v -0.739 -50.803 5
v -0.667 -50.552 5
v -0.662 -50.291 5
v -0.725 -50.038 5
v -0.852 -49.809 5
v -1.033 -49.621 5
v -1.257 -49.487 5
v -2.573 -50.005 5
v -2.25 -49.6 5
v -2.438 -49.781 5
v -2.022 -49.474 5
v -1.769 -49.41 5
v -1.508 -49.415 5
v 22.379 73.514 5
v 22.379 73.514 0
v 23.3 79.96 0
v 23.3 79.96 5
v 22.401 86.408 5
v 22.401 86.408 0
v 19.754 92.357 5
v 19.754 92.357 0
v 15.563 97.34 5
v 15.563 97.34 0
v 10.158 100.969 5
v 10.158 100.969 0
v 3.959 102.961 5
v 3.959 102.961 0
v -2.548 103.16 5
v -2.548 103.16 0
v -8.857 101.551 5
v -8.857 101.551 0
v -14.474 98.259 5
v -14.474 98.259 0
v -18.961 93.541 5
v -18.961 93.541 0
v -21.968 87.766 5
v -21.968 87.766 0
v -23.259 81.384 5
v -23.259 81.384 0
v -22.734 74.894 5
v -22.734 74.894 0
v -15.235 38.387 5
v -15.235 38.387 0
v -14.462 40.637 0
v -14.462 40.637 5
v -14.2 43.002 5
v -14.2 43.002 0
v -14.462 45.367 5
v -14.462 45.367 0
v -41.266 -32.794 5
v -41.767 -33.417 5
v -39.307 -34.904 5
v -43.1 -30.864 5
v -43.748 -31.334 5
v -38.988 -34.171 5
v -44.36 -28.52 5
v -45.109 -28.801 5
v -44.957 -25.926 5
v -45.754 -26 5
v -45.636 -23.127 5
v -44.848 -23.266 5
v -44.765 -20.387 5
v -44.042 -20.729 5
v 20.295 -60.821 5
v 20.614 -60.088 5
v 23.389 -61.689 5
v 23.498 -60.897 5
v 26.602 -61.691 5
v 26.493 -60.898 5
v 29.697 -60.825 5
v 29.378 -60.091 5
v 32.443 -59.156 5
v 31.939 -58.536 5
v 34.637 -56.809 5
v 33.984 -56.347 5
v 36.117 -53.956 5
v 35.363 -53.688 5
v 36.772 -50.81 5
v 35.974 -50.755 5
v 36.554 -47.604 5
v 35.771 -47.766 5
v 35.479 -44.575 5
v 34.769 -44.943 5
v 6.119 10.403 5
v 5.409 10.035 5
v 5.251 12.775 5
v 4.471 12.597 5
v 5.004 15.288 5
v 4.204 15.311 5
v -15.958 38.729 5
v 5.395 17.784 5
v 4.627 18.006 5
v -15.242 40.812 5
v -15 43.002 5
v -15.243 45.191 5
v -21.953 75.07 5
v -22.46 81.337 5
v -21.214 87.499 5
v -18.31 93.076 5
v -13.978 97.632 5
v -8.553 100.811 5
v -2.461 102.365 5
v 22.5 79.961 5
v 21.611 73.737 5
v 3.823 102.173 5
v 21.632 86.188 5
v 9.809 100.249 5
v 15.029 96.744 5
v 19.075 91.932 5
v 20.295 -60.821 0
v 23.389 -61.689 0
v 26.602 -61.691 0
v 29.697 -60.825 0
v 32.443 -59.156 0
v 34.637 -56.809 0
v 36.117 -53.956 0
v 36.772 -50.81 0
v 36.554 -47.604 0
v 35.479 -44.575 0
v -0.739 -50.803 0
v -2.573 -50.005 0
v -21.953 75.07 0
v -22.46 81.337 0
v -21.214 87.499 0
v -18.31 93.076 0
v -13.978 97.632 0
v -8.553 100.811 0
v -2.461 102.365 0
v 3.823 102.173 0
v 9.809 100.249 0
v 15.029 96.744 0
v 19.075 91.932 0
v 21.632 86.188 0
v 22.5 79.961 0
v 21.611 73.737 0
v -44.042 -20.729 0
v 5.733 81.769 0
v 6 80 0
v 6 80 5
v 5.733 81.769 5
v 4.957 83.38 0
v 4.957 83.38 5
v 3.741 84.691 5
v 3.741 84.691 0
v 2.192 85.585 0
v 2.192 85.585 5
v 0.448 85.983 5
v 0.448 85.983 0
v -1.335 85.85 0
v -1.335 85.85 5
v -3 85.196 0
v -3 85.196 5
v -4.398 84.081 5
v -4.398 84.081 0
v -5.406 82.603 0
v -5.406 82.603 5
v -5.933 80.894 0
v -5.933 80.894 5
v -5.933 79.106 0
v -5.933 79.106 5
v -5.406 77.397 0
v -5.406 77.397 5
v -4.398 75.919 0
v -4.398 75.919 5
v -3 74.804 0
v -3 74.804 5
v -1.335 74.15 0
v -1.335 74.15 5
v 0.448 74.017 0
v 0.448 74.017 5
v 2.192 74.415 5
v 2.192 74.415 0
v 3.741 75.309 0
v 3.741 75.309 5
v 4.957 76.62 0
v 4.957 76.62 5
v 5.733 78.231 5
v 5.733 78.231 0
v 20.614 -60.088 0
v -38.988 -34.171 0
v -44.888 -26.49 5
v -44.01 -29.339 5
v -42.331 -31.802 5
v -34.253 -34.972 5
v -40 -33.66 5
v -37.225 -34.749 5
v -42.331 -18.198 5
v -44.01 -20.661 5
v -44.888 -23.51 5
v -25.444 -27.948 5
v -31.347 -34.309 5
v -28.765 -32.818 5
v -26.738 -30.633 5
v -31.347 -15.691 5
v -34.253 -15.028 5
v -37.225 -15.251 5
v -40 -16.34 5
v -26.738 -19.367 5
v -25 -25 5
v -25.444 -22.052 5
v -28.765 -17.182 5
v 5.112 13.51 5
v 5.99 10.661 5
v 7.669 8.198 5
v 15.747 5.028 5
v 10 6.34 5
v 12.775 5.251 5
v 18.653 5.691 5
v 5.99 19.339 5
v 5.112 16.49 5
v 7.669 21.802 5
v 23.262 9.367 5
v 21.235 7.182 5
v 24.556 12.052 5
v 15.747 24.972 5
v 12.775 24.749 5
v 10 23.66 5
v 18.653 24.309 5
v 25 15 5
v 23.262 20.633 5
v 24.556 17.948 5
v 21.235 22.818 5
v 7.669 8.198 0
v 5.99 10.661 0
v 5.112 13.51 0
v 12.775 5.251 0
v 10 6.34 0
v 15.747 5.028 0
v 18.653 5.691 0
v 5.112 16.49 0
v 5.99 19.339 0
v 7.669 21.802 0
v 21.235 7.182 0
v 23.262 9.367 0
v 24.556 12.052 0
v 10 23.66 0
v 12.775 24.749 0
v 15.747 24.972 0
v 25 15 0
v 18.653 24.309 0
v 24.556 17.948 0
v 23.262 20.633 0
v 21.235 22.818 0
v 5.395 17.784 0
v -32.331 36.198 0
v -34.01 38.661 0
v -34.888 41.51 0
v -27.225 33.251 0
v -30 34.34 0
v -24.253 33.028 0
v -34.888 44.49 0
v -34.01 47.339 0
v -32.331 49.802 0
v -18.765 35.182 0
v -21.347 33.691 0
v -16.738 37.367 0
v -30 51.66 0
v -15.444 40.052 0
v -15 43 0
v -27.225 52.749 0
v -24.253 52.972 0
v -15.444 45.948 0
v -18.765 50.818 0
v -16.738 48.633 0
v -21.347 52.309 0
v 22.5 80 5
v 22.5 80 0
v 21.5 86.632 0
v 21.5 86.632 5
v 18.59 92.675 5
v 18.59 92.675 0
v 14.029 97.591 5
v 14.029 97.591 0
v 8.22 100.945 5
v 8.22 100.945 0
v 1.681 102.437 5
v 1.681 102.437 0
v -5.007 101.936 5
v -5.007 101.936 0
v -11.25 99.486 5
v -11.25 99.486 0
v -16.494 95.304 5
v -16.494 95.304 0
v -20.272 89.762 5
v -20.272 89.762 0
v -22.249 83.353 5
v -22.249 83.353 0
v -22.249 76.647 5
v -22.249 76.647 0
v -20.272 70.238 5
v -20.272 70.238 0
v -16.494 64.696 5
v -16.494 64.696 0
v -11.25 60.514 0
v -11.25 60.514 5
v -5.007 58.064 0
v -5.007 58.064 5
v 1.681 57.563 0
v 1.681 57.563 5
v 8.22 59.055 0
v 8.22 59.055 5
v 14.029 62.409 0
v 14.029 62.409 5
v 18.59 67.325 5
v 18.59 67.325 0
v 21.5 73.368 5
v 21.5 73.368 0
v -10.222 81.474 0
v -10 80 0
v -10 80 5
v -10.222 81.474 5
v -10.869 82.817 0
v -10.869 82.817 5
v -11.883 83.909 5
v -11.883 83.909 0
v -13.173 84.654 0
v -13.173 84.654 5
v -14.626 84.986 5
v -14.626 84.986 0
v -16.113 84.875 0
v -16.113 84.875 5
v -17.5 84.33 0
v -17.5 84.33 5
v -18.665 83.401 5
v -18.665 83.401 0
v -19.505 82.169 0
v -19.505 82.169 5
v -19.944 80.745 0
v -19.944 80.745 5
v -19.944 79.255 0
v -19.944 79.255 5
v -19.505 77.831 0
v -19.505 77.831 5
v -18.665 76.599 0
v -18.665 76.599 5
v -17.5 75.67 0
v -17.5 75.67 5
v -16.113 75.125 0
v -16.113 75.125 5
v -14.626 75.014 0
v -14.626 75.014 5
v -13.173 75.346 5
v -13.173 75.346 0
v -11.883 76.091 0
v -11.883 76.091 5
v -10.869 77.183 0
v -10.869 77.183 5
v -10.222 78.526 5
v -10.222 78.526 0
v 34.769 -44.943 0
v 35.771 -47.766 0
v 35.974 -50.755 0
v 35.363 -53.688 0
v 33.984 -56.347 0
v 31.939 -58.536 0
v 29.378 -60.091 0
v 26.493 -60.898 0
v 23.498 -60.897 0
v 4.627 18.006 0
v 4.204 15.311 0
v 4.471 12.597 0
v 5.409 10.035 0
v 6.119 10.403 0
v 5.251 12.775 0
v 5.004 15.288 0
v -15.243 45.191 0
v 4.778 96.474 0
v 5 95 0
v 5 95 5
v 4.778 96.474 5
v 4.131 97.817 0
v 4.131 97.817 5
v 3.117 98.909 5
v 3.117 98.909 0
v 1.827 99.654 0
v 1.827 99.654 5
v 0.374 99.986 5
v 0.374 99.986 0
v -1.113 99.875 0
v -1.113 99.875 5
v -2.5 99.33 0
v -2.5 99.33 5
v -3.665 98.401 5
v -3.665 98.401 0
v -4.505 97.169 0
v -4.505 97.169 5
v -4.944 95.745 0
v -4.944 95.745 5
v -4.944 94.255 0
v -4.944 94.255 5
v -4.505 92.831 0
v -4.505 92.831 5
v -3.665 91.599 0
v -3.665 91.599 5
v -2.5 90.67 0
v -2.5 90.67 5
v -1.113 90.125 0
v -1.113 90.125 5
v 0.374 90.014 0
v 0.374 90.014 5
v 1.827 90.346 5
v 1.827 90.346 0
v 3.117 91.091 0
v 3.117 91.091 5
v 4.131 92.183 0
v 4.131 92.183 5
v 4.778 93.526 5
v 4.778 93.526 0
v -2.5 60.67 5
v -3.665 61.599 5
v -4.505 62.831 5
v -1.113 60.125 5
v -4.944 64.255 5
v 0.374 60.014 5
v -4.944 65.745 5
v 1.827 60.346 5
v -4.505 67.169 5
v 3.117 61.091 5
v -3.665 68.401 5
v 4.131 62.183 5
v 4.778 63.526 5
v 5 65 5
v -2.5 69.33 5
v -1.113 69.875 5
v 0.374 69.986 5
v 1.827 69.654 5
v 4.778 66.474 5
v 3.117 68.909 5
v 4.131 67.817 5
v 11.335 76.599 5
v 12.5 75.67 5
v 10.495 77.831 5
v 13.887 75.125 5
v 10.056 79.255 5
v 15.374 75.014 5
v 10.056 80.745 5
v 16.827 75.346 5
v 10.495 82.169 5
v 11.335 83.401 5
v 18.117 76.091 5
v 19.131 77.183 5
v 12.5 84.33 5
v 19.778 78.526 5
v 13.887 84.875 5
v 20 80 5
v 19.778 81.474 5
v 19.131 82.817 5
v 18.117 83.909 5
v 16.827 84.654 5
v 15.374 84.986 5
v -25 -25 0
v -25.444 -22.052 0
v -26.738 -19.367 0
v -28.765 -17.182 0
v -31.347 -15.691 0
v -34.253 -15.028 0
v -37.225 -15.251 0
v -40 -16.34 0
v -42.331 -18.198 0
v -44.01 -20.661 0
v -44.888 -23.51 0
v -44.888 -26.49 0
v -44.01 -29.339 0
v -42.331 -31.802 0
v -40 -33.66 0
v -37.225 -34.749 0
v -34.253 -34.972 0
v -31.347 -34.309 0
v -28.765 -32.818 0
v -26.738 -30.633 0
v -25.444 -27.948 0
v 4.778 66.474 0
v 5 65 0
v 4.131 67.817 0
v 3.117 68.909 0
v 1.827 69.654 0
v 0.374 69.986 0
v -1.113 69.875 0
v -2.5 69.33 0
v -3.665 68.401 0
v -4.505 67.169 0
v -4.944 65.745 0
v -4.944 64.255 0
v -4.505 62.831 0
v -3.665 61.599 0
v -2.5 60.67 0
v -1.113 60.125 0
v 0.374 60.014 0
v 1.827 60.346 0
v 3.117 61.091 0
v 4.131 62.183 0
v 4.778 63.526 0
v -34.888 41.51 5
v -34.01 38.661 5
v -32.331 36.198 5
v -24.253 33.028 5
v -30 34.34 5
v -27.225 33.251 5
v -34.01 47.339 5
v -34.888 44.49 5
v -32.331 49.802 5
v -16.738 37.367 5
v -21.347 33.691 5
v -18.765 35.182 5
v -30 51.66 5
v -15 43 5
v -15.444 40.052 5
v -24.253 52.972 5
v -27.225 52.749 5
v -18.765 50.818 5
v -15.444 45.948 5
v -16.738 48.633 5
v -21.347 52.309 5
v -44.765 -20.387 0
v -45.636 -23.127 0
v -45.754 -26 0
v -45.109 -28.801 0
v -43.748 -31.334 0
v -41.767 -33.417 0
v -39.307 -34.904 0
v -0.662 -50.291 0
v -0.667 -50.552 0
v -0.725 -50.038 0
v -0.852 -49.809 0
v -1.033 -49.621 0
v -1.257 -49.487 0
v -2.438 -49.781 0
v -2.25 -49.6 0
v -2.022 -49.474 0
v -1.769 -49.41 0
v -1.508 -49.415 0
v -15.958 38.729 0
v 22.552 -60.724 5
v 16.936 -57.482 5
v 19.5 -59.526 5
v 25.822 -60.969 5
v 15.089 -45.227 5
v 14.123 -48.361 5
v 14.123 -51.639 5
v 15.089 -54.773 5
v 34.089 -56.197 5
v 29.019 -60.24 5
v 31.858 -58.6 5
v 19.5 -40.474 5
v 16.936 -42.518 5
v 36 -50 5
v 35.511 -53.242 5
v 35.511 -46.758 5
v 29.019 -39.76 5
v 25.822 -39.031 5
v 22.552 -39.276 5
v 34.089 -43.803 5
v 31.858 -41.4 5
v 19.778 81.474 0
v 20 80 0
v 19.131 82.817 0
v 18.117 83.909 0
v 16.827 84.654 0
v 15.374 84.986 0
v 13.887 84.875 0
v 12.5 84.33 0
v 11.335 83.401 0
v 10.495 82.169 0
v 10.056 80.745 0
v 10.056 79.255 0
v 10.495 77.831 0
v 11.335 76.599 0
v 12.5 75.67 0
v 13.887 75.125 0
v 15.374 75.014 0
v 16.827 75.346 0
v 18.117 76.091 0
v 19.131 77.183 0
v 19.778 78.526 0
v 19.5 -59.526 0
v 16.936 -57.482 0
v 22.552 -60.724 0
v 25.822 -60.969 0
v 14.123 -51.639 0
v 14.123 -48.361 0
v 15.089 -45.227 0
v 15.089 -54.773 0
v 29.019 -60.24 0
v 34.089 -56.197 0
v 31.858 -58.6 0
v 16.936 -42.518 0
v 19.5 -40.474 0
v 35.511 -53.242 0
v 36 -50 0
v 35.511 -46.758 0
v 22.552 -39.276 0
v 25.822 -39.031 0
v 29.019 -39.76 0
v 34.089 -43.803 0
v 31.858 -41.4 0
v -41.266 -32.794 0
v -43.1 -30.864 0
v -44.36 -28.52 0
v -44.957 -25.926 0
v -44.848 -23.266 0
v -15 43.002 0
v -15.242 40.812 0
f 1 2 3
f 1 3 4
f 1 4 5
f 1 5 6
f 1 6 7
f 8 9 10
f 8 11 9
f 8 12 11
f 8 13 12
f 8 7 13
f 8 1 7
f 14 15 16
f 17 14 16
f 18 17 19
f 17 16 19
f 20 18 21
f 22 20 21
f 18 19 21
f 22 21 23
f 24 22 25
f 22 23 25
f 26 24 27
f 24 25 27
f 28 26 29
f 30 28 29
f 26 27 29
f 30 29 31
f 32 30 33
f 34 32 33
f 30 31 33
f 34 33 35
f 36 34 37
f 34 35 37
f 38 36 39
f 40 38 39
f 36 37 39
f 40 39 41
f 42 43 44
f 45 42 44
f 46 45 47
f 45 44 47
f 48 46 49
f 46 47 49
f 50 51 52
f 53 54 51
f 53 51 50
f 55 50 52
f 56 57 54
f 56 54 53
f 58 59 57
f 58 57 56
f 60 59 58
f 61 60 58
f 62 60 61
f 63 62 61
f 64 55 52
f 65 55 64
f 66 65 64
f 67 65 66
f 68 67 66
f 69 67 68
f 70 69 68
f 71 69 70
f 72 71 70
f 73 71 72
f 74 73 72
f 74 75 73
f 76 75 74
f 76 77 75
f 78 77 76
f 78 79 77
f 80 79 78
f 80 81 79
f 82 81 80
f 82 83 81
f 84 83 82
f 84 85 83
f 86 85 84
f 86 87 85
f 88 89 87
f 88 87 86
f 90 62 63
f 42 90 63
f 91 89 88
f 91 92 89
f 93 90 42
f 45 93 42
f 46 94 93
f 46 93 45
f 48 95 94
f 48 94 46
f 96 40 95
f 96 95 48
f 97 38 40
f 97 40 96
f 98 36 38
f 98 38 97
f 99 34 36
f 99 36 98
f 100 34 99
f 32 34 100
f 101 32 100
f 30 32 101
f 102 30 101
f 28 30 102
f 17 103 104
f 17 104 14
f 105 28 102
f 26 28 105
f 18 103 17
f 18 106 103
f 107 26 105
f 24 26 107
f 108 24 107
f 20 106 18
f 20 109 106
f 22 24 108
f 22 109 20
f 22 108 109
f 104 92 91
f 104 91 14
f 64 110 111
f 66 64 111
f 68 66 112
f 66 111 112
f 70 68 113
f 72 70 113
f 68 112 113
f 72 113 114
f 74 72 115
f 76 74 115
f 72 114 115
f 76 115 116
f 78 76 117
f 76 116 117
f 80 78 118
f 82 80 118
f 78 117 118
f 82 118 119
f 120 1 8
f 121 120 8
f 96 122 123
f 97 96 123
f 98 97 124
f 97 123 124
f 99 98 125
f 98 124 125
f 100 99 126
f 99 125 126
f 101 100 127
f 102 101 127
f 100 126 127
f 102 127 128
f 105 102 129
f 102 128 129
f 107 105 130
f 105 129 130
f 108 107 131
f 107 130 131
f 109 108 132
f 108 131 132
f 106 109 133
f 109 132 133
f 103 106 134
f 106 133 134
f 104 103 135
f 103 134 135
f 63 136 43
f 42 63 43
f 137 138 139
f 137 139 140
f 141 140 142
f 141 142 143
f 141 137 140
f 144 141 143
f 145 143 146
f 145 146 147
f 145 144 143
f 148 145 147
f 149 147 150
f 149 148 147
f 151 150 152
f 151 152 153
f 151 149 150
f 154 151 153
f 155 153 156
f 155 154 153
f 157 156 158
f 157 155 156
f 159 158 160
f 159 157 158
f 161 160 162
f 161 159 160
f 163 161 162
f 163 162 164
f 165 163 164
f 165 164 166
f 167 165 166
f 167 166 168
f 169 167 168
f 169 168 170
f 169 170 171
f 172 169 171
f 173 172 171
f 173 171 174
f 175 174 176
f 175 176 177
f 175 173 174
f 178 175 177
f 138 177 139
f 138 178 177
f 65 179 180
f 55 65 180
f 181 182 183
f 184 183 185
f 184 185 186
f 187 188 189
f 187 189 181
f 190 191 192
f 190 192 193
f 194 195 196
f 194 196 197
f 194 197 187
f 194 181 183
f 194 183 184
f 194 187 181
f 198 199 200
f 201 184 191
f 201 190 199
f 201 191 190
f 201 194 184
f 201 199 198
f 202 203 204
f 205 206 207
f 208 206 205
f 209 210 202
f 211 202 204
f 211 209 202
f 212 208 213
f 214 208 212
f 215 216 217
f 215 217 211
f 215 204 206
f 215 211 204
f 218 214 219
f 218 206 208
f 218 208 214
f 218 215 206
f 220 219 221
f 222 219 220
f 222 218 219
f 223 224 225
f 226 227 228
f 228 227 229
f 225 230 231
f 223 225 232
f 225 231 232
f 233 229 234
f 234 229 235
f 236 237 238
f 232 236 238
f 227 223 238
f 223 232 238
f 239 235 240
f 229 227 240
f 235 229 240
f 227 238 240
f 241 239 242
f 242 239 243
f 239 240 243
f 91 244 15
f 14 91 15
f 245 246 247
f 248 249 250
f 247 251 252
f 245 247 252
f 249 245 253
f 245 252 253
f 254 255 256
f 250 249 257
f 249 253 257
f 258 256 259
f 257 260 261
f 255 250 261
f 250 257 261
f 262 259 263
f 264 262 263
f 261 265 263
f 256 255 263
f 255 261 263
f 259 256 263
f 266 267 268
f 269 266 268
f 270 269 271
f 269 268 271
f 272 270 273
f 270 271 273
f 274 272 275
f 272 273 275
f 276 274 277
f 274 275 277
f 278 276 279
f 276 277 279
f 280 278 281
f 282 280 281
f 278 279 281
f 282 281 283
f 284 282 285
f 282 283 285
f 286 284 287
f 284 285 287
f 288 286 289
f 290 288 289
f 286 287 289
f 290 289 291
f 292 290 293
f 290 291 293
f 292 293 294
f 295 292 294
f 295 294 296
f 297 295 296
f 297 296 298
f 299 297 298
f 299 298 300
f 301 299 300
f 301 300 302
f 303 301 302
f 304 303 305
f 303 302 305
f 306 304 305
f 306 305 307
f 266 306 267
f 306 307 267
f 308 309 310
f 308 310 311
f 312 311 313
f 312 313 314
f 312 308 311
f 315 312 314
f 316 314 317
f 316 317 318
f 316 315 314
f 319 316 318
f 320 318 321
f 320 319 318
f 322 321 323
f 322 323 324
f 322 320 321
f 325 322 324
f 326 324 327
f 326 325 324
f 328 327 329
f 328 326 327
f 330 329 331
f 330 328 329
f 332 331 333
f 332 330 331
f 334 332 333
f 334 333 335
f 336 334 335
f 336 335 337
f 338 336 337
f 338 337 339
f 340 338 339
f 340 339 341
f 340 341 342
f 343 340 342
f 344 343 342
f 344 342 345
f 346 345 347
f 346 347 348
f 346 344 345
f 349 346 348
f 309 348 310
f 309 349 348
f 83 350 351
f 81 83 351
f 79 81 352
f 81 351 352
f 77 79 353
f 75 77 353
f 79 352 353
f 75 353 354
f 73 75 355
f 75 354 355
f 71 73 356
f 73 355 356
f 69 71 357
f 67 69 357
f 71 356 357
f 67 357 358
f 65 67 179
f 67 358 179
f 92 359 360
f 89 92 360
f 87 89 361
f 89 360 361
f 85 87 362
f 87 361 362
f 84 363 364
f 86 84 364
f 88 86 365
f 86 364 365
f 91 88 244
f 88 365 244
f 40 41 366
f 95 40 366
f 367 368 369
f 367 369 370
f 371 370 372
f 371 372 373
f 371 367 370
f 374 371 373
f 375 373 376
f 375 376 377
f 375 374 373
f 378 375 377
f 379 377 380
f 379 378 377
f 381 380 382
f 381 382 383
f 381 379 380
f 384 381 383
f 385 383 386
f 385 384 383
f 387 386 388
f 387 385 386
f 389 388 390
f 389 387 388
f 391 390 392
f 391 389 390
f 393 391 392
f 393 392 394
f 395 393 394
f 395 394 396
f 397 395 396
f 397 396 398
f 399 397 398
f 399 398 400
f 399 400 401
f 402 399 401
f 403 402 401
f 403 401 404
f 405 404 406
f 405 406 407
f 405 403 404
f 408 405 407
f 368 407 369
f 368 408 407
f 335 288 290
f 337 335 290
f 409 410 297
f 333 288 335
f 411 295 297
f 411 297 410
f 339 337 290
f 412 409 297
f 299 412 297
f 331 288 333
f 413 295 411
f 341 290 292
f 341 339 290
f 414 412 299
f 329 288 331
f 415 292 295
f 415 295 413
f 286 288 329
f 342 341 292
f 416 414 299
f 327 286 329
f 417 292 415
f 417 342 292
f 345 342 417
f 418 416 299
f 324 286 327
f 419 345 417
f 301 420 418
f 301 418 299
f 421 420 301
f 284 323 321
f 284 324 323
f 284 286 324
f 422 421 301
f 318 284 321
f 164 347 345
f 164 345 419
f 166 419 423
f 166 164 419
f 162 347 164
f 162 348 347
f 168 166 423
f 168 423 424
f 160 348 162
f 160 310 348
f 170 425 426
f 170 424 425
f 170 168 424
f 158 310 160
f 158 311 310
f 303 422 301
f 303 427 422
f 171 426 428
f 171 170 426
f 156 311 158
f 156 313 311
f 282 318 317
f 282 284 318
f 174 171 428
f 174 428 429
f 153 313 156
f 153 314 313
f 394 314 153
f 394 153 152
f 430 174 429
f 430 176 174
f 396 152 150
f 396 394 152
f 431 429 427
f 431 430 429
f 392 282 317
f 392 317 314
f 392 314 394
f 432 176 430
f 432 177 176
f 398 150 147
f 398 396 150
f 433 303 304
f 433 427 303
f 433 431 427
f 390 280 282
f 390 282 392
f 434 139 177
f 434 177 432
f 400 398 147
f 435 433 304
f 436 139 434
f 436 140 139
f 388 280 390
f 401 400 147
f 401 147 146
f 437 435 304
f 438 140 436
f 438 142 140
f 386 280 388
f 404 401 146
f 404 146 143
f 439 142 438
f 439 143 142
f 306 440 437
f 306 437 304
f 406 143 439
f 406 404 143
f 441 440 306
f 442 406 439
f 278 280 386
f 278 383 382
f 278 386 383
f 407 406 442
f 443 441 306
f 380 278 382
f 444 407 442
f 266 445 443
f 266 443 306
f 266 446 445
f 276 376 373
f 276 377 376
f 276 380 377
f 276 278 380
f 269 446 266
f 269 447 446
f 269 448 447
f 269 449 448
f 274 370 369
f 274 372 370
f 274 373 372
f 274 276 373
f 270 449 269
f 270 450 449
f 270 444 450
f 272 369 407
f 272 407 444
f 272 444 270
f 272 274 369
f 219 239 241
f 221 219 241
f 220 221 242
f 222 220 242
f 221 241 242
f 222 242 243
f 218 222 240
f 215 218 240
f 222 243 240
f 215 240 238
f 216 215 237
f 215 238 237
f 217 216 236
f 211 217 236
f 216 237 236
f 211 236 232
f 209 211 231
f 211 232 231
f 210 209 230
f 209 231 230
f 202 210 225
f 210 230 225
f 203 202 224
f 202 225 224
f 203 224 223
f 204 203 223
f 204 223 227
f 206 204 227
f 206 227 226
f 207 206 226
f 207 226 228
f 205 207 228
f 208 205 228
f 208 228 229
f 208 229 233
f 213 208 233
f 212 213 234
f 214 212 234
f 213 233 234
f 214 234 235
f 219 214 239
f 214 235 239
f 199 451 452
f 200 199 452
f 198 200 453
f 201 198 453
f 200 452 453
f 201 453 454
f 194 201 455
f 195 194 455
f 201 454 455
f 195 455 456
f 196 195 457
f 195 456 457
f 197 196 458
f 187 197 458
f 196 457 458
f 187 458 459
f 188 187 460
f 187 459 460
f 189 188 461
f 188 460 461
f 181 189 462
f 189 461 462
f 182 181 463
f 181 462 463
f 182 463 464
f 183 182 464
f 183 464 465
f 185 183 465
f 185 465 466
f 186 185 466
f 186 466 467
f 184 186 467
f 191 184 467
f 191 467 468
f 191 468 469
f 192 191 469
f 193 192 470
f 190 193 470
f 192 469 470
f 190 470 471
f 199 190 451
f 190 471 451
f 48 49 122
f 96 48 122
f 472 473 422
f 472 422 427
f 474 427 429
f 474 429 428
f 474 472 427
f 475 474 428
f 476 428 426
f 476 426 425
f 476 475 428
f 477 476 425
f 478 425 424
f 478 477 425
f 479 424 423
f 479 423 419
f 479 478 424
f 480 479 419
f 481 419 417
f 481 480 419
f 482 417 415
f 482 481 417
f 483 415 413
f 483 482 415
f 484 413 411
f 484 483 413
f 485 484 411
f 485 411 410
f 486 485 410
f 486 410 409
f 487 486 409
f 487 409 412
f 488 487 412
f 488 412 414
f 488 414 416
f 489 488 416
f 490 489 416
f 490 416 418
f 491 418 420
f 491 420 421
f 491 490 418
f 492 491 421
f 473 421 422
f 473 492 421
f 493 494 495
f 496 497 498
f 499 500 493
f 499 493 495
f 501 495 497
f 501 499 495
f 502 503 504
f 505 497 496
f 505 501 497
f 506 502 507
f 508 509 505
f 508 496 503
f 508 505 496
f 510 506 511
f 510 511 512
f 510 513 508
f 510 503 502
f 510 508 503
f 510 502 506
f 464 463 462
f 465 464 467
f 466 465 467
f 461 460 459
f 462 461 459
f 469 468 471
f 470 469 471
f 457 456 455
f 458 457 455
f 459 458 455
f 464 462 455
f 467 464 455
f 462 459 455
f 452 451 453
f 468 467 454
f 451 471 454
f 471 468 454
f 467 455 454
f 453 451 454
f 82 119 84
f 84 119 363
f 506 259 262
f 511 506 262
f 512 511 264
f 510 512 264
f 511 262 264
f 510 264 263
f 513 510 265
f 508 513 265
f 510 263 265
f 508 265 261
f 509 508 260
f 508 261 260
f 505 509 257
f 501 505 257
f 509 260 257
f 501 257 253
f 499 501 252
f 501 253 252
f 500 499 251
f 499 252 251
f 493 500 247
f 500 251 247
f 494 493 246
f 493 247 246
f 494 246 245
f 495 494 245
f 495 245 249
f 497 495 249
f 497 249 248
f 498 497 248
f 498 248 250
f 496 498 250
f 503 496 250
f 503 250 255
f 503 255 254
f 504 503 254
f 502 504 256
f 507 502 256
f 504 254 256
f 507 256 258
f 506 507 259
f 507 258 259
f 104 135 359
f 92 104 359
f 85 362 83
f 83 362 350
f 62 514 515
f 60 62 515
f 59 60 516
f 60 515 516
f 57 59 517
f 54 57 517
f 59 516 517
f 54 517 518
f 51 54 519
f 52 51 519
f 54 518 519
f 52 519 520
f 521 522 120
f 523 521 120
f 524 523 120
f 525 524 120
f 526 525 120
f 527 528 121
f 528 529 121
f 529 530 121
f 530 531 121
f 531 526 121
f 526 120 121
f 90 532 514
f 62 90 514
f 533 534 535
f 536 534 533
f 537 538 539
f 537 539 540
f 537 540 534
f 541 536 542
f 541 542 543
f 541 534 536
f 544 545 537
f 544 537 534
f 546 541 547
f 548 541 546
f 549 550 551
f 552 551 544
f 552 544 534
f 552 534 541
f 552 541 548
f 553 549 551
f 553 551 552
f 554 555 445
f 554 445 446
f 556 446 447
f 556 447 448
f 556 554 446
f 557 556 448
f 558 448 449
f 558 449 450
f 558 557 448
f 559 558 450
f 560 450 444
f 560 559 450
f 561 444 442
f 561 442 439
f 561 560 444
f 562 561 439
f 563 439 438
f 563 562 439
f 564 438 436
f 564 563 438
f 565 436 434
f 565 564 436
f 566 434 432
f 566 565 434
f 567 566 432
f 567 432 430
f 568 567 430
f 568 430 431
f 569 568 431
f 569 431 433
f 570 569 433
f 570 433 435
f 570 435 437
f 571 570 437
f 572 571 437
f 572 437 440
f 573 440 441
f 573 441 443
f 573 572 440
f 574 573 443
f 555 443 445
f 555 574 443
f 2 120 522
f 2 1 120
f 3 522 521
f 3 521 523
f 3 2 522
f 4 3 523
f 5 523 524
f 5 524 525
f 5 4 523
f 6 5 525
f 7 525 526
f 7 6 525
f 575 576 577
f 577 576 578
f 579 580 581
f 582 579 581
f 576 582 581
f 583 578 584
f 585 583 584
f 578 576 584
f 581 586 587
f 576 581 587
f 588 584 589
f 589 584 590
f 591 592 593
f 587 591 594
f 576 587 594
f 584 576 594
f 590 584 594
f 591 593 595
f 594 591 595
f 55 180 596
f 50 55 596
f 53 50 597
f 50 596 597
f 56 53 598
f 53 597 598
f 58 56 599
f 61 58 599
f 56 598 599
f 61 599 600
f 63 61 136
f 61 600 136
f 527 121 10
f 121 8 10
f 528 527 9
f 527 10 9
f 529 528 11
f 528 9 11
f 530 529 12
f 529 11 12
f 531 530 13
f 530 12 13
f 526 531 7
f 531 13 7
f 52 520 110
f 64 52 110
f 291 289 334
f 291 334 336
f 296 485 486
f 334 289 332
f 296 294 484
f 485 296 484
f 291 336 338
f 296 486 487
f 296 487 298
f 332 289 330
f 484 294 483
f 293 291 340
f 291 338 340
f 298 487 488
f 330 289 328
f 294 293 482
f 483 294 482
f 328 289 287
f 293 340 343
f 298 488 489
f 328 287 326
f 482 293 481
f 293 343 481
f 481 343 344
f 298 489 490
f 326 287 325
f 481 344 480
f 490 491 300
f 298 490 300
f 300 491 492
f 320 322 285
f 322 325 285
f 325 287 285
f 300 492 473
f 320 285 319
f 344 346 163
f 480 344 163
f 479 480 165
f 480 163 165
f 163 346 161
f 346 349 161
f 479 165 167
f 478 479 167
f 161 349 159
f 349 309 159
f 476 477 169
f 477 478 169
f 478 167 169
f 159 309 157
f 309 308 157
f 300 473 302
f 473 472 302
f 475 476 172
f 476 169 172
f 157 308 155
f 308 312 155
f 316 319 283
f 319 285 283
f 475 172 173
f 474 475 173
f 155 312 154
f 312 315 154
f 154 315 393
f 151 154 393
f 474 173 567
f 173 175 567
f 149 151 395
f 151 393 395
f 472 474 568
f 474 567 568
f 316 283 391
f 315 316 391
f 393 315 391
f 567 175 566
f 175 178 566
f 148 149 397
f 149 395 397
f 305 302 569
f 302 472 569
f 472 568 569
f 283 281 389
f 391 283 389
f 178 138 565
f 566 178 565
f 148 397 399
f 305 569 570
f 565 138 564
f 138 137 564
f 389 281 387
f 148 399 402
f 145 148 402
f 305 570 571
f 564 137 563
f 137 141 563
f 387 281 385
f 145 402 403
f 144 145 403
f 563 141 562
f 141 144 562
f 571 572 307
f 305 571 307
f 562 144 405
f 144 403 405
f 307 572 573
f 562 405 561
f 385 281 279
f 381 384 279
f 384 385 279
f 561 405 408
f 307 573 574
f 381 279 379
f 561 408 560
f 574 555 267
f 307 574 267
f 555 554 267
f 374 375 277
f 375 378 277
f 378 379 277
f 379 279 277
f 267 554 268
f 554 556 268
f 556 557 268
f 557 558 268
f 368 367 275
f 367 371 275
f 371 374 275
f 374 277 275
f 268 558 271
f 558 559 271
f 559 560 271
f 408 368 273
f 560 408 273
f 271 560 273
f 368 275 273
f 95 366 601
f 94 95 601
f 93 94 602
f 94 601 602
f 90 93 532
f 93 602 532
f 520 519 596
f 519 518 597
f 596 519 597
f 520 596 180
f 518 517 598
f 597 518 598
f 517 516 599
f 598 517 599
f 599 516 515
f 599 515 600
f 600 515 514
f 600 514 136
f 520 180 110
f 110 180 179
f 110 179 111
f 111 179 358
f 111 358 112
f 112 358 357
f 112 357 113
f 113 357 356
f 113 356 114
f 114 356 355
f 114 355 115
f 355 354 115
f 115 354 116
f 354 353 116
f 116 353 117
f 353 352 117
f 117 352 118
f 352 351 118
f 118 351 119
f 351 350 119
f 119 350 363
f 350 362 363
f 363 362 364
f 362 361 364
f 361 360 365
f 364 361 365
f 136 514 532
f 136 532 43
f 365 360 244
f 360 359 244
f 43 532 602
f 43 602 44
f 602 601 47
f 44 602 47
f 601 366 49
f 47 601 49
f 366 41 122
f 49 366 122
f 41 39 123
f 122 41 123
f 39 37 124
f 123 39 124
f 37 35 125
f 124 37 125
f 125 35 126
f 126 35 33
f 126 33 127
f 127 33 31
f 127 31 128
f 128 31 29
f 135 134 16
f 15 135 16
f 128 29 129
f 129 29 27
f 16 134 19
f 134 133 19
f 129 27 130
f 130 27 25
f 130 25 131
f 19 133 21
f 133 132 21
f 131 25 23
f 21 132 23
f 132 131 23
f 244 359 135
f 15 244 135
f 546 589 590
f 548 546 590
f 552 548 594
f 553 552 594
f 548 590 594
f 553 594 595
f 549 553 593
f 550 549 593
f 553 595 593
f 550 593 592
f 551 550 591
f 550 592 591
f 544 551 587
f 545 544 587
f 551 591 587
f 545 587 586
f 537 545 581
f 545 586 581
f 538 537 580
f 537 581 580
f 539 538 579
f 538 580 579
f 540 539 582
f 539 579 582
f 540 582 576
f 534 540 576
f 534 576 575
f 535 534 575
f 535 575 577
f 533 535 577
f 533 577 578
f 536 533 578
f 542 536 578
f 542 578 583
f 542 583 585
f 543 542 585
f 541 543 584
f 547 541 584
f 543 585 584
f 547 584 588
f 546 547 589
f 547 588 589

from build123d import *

# Parameters (mm, degrees)
F0_R     = 10
F1_DEPTH = 5
F0_R_2   = 11
F0_R_3   = 22.5
F0_R_4   = 5
F0_R_5   = 6
F3_DEPTH = 5
F4_W     = 2
F4_H     = 5
F5_DEPTH = 1
F6_R     = 0.99999


# Not quite as in the source:
# - a fillet or chamfer is up to 0.001 mm smaller than in the source, because OpenCascade refuses the exact size


with BuildPart() as f1:
    # F0 (on Top) → F1 (new body)
    with BuildSketch(Plane.XY):
        with Locations((-25, 43)):
            Circle(F0_R)
    extrude(amount=F1_DEPTH)


with BuildPart() as f1b:
    # F0 (on Top) → F1, piece 2 (new body)
    with BuildSketch(Plane.XY):
        with Locations((15, 15)):
            Circle(F0_R)
    extrude(amount=F1_DEPTH)


with BuildPart() as f1c:
    # F0 (on Top) → F1, piece 3 (new body)
    with BuildSketch(Plane.XY):
        with Locations((-35, -25)):
            Circle(F0_R)
    extrude(amount=F1_DEPTH)


with BuildPart() as f1d:
    # F0 (on Top) → F1, piece 4 (new body)
    with BuildSketch(Plane.XY):
        with Locations((25, -50)):
            Circle(F0_R_2)
    extrude(amount=F1_DEPTH)


with BuildPart() as f1e:
    # F0 (on Top) → F1, piece 5 (new body)
    with BuildSketch(Plane.XY):
        with Locations((0, 80)):
            Circle(F0_R_3)
        with Locations((-15, 80)):
            Circle(F0_R_4, mode=Mode.SUBTRACT)
        with Locations((0, 65)):
            Circle(F0_R_4, mode=Mode.SUBTRACT)
        with Locations((0, 80)):
            Circle(F0_R_5, mode=Mode.SUBTRACT)
        with Locations((15, 80)):
            Circle(F0_R_4, mode=Mode.SUBTRACT)
        with Locations((0, 95)):
            Circle(F0_R_4, mode=Mode.SUBTRACT)
    extrude(amount=F1_DEPTH)


with BuildPart() as f3:
    # F2 (on Top) → F3 (new body)
    with BuildSketch(Plane.XY):
        with BuildLine():
            ThreePointArc((-15.2430288474, 45.1912357077), (-15.0606342981, 41.9004503453), (-15.9579069335, 38.7291039608))
            Line((-15.9579069335, 38.7291039608), (-44.7654605118, -20.3874322777))
            ThreePointArc((-44.7654605118, -20.3874322777), (-45.1089247172, -28.8012683491), (-39.3067273264, -34.9041455833))
            Line((-39.3067273264, -34.9041455833), (20.2945016249, -60.8211961003))
            ThreePointArc((20.2945016249, -60.8211961003), (33.6205994102, -58.0576215975), (35.4792552674, -44.5754991896))
            Line((35.4792552674, -44.5754991896), (6.1192751972, 10.4029654149))
            ThreePointArc((6.1192751972, 10.4029654149), (5.0477785416, 14.0236352918), (5.3952054736, 17.7835089554))
            Line((5.3952054736, 17.7835089554), (22.3791712466, 73.5144241338))
            ThreePointArc((22.3791712466, 73.5144241338), (0.7124099554, 103.2891062958), (-22.7337427856, 74.8944208011))
            Line((-22.7337427856, 74.8944208011), (-15.2430288474, 45.1912357077))
        make_face()
        with BuildLine():
            ThreePointArc((-21.9531850934, 75.0697196577), (0.6879495277, 102.4894803285), (21.6107876845, 73.7371048503))
            Line((21.6107876845, 73.7371048503), (4.6268219115, 18.0061896719))
            ThreePointArc((4.6268219115, 18.0061896719), (4.251600825, 13.9455261151), (5.4088172129, 10.0352026481))
            Line((5.4088172129, 10.0352026481), (34.7687972831, -44.9432619564))
            ThreePointArc((34.7687972831, -44.9432619564), (33.0361519926, -57.5113421672), (20.6135184639, -60.0875556867))
            Line((20.6135184639, -60.0875556867), (-38.9877104874, -34.1705051698))
            ThreePointArc((-38.9877104874, -34.1705051698), (-44.3601154789, -28.5196929159), (-44.0420930665, -20.7291039608))
            Line((-44.0420930665, -20.7291039608), (-15.2345394882, 38.3874322777))
            ThreePointArc((-15.2345394882, 38.3874322777), (-14.2654850419, 41.8124863729), (-14.4624711552, 45.3665345643))
            Line((-14.4624711552, 45.3665345643), (-21.9531850934, 75.0697196577))
        make_face(mode=Mode.SUBTRACT)
    extrude(amount=F3_DEPTH)


with BuildPart() as f5:
    # F4 (on face) → F5 (new body)
    with BuildSketch(Plane(origin=(-18.6956826234, -42.994308311, 0), x_dir=(-0.917050517, 0.3987710487, 0), z_dir=(0.3987710487, 0.917050517, 0))):
        with Locations((-18.5813830942, 2.5)):
            Rectangle(F4_W, F4_H)
    extrude(amount=F5_DEPTH)

    # F6 (radius 1 in the source; OpenCascade refuses exactly that, so slightly less here)
    f6_edges = [f5.edges().sort_by_distance(p)[0] for p in [
        (-2.173895, -49.088204, 2.5),
        (-0.339794, -49.885746, 2.5),
    ]]
    fillet(f6_edges, radius=F6_R)


solid = Compound([f1.part, f1b.part, f1c.part, f1d.part, f1e.part, f3.part, f5.part])
